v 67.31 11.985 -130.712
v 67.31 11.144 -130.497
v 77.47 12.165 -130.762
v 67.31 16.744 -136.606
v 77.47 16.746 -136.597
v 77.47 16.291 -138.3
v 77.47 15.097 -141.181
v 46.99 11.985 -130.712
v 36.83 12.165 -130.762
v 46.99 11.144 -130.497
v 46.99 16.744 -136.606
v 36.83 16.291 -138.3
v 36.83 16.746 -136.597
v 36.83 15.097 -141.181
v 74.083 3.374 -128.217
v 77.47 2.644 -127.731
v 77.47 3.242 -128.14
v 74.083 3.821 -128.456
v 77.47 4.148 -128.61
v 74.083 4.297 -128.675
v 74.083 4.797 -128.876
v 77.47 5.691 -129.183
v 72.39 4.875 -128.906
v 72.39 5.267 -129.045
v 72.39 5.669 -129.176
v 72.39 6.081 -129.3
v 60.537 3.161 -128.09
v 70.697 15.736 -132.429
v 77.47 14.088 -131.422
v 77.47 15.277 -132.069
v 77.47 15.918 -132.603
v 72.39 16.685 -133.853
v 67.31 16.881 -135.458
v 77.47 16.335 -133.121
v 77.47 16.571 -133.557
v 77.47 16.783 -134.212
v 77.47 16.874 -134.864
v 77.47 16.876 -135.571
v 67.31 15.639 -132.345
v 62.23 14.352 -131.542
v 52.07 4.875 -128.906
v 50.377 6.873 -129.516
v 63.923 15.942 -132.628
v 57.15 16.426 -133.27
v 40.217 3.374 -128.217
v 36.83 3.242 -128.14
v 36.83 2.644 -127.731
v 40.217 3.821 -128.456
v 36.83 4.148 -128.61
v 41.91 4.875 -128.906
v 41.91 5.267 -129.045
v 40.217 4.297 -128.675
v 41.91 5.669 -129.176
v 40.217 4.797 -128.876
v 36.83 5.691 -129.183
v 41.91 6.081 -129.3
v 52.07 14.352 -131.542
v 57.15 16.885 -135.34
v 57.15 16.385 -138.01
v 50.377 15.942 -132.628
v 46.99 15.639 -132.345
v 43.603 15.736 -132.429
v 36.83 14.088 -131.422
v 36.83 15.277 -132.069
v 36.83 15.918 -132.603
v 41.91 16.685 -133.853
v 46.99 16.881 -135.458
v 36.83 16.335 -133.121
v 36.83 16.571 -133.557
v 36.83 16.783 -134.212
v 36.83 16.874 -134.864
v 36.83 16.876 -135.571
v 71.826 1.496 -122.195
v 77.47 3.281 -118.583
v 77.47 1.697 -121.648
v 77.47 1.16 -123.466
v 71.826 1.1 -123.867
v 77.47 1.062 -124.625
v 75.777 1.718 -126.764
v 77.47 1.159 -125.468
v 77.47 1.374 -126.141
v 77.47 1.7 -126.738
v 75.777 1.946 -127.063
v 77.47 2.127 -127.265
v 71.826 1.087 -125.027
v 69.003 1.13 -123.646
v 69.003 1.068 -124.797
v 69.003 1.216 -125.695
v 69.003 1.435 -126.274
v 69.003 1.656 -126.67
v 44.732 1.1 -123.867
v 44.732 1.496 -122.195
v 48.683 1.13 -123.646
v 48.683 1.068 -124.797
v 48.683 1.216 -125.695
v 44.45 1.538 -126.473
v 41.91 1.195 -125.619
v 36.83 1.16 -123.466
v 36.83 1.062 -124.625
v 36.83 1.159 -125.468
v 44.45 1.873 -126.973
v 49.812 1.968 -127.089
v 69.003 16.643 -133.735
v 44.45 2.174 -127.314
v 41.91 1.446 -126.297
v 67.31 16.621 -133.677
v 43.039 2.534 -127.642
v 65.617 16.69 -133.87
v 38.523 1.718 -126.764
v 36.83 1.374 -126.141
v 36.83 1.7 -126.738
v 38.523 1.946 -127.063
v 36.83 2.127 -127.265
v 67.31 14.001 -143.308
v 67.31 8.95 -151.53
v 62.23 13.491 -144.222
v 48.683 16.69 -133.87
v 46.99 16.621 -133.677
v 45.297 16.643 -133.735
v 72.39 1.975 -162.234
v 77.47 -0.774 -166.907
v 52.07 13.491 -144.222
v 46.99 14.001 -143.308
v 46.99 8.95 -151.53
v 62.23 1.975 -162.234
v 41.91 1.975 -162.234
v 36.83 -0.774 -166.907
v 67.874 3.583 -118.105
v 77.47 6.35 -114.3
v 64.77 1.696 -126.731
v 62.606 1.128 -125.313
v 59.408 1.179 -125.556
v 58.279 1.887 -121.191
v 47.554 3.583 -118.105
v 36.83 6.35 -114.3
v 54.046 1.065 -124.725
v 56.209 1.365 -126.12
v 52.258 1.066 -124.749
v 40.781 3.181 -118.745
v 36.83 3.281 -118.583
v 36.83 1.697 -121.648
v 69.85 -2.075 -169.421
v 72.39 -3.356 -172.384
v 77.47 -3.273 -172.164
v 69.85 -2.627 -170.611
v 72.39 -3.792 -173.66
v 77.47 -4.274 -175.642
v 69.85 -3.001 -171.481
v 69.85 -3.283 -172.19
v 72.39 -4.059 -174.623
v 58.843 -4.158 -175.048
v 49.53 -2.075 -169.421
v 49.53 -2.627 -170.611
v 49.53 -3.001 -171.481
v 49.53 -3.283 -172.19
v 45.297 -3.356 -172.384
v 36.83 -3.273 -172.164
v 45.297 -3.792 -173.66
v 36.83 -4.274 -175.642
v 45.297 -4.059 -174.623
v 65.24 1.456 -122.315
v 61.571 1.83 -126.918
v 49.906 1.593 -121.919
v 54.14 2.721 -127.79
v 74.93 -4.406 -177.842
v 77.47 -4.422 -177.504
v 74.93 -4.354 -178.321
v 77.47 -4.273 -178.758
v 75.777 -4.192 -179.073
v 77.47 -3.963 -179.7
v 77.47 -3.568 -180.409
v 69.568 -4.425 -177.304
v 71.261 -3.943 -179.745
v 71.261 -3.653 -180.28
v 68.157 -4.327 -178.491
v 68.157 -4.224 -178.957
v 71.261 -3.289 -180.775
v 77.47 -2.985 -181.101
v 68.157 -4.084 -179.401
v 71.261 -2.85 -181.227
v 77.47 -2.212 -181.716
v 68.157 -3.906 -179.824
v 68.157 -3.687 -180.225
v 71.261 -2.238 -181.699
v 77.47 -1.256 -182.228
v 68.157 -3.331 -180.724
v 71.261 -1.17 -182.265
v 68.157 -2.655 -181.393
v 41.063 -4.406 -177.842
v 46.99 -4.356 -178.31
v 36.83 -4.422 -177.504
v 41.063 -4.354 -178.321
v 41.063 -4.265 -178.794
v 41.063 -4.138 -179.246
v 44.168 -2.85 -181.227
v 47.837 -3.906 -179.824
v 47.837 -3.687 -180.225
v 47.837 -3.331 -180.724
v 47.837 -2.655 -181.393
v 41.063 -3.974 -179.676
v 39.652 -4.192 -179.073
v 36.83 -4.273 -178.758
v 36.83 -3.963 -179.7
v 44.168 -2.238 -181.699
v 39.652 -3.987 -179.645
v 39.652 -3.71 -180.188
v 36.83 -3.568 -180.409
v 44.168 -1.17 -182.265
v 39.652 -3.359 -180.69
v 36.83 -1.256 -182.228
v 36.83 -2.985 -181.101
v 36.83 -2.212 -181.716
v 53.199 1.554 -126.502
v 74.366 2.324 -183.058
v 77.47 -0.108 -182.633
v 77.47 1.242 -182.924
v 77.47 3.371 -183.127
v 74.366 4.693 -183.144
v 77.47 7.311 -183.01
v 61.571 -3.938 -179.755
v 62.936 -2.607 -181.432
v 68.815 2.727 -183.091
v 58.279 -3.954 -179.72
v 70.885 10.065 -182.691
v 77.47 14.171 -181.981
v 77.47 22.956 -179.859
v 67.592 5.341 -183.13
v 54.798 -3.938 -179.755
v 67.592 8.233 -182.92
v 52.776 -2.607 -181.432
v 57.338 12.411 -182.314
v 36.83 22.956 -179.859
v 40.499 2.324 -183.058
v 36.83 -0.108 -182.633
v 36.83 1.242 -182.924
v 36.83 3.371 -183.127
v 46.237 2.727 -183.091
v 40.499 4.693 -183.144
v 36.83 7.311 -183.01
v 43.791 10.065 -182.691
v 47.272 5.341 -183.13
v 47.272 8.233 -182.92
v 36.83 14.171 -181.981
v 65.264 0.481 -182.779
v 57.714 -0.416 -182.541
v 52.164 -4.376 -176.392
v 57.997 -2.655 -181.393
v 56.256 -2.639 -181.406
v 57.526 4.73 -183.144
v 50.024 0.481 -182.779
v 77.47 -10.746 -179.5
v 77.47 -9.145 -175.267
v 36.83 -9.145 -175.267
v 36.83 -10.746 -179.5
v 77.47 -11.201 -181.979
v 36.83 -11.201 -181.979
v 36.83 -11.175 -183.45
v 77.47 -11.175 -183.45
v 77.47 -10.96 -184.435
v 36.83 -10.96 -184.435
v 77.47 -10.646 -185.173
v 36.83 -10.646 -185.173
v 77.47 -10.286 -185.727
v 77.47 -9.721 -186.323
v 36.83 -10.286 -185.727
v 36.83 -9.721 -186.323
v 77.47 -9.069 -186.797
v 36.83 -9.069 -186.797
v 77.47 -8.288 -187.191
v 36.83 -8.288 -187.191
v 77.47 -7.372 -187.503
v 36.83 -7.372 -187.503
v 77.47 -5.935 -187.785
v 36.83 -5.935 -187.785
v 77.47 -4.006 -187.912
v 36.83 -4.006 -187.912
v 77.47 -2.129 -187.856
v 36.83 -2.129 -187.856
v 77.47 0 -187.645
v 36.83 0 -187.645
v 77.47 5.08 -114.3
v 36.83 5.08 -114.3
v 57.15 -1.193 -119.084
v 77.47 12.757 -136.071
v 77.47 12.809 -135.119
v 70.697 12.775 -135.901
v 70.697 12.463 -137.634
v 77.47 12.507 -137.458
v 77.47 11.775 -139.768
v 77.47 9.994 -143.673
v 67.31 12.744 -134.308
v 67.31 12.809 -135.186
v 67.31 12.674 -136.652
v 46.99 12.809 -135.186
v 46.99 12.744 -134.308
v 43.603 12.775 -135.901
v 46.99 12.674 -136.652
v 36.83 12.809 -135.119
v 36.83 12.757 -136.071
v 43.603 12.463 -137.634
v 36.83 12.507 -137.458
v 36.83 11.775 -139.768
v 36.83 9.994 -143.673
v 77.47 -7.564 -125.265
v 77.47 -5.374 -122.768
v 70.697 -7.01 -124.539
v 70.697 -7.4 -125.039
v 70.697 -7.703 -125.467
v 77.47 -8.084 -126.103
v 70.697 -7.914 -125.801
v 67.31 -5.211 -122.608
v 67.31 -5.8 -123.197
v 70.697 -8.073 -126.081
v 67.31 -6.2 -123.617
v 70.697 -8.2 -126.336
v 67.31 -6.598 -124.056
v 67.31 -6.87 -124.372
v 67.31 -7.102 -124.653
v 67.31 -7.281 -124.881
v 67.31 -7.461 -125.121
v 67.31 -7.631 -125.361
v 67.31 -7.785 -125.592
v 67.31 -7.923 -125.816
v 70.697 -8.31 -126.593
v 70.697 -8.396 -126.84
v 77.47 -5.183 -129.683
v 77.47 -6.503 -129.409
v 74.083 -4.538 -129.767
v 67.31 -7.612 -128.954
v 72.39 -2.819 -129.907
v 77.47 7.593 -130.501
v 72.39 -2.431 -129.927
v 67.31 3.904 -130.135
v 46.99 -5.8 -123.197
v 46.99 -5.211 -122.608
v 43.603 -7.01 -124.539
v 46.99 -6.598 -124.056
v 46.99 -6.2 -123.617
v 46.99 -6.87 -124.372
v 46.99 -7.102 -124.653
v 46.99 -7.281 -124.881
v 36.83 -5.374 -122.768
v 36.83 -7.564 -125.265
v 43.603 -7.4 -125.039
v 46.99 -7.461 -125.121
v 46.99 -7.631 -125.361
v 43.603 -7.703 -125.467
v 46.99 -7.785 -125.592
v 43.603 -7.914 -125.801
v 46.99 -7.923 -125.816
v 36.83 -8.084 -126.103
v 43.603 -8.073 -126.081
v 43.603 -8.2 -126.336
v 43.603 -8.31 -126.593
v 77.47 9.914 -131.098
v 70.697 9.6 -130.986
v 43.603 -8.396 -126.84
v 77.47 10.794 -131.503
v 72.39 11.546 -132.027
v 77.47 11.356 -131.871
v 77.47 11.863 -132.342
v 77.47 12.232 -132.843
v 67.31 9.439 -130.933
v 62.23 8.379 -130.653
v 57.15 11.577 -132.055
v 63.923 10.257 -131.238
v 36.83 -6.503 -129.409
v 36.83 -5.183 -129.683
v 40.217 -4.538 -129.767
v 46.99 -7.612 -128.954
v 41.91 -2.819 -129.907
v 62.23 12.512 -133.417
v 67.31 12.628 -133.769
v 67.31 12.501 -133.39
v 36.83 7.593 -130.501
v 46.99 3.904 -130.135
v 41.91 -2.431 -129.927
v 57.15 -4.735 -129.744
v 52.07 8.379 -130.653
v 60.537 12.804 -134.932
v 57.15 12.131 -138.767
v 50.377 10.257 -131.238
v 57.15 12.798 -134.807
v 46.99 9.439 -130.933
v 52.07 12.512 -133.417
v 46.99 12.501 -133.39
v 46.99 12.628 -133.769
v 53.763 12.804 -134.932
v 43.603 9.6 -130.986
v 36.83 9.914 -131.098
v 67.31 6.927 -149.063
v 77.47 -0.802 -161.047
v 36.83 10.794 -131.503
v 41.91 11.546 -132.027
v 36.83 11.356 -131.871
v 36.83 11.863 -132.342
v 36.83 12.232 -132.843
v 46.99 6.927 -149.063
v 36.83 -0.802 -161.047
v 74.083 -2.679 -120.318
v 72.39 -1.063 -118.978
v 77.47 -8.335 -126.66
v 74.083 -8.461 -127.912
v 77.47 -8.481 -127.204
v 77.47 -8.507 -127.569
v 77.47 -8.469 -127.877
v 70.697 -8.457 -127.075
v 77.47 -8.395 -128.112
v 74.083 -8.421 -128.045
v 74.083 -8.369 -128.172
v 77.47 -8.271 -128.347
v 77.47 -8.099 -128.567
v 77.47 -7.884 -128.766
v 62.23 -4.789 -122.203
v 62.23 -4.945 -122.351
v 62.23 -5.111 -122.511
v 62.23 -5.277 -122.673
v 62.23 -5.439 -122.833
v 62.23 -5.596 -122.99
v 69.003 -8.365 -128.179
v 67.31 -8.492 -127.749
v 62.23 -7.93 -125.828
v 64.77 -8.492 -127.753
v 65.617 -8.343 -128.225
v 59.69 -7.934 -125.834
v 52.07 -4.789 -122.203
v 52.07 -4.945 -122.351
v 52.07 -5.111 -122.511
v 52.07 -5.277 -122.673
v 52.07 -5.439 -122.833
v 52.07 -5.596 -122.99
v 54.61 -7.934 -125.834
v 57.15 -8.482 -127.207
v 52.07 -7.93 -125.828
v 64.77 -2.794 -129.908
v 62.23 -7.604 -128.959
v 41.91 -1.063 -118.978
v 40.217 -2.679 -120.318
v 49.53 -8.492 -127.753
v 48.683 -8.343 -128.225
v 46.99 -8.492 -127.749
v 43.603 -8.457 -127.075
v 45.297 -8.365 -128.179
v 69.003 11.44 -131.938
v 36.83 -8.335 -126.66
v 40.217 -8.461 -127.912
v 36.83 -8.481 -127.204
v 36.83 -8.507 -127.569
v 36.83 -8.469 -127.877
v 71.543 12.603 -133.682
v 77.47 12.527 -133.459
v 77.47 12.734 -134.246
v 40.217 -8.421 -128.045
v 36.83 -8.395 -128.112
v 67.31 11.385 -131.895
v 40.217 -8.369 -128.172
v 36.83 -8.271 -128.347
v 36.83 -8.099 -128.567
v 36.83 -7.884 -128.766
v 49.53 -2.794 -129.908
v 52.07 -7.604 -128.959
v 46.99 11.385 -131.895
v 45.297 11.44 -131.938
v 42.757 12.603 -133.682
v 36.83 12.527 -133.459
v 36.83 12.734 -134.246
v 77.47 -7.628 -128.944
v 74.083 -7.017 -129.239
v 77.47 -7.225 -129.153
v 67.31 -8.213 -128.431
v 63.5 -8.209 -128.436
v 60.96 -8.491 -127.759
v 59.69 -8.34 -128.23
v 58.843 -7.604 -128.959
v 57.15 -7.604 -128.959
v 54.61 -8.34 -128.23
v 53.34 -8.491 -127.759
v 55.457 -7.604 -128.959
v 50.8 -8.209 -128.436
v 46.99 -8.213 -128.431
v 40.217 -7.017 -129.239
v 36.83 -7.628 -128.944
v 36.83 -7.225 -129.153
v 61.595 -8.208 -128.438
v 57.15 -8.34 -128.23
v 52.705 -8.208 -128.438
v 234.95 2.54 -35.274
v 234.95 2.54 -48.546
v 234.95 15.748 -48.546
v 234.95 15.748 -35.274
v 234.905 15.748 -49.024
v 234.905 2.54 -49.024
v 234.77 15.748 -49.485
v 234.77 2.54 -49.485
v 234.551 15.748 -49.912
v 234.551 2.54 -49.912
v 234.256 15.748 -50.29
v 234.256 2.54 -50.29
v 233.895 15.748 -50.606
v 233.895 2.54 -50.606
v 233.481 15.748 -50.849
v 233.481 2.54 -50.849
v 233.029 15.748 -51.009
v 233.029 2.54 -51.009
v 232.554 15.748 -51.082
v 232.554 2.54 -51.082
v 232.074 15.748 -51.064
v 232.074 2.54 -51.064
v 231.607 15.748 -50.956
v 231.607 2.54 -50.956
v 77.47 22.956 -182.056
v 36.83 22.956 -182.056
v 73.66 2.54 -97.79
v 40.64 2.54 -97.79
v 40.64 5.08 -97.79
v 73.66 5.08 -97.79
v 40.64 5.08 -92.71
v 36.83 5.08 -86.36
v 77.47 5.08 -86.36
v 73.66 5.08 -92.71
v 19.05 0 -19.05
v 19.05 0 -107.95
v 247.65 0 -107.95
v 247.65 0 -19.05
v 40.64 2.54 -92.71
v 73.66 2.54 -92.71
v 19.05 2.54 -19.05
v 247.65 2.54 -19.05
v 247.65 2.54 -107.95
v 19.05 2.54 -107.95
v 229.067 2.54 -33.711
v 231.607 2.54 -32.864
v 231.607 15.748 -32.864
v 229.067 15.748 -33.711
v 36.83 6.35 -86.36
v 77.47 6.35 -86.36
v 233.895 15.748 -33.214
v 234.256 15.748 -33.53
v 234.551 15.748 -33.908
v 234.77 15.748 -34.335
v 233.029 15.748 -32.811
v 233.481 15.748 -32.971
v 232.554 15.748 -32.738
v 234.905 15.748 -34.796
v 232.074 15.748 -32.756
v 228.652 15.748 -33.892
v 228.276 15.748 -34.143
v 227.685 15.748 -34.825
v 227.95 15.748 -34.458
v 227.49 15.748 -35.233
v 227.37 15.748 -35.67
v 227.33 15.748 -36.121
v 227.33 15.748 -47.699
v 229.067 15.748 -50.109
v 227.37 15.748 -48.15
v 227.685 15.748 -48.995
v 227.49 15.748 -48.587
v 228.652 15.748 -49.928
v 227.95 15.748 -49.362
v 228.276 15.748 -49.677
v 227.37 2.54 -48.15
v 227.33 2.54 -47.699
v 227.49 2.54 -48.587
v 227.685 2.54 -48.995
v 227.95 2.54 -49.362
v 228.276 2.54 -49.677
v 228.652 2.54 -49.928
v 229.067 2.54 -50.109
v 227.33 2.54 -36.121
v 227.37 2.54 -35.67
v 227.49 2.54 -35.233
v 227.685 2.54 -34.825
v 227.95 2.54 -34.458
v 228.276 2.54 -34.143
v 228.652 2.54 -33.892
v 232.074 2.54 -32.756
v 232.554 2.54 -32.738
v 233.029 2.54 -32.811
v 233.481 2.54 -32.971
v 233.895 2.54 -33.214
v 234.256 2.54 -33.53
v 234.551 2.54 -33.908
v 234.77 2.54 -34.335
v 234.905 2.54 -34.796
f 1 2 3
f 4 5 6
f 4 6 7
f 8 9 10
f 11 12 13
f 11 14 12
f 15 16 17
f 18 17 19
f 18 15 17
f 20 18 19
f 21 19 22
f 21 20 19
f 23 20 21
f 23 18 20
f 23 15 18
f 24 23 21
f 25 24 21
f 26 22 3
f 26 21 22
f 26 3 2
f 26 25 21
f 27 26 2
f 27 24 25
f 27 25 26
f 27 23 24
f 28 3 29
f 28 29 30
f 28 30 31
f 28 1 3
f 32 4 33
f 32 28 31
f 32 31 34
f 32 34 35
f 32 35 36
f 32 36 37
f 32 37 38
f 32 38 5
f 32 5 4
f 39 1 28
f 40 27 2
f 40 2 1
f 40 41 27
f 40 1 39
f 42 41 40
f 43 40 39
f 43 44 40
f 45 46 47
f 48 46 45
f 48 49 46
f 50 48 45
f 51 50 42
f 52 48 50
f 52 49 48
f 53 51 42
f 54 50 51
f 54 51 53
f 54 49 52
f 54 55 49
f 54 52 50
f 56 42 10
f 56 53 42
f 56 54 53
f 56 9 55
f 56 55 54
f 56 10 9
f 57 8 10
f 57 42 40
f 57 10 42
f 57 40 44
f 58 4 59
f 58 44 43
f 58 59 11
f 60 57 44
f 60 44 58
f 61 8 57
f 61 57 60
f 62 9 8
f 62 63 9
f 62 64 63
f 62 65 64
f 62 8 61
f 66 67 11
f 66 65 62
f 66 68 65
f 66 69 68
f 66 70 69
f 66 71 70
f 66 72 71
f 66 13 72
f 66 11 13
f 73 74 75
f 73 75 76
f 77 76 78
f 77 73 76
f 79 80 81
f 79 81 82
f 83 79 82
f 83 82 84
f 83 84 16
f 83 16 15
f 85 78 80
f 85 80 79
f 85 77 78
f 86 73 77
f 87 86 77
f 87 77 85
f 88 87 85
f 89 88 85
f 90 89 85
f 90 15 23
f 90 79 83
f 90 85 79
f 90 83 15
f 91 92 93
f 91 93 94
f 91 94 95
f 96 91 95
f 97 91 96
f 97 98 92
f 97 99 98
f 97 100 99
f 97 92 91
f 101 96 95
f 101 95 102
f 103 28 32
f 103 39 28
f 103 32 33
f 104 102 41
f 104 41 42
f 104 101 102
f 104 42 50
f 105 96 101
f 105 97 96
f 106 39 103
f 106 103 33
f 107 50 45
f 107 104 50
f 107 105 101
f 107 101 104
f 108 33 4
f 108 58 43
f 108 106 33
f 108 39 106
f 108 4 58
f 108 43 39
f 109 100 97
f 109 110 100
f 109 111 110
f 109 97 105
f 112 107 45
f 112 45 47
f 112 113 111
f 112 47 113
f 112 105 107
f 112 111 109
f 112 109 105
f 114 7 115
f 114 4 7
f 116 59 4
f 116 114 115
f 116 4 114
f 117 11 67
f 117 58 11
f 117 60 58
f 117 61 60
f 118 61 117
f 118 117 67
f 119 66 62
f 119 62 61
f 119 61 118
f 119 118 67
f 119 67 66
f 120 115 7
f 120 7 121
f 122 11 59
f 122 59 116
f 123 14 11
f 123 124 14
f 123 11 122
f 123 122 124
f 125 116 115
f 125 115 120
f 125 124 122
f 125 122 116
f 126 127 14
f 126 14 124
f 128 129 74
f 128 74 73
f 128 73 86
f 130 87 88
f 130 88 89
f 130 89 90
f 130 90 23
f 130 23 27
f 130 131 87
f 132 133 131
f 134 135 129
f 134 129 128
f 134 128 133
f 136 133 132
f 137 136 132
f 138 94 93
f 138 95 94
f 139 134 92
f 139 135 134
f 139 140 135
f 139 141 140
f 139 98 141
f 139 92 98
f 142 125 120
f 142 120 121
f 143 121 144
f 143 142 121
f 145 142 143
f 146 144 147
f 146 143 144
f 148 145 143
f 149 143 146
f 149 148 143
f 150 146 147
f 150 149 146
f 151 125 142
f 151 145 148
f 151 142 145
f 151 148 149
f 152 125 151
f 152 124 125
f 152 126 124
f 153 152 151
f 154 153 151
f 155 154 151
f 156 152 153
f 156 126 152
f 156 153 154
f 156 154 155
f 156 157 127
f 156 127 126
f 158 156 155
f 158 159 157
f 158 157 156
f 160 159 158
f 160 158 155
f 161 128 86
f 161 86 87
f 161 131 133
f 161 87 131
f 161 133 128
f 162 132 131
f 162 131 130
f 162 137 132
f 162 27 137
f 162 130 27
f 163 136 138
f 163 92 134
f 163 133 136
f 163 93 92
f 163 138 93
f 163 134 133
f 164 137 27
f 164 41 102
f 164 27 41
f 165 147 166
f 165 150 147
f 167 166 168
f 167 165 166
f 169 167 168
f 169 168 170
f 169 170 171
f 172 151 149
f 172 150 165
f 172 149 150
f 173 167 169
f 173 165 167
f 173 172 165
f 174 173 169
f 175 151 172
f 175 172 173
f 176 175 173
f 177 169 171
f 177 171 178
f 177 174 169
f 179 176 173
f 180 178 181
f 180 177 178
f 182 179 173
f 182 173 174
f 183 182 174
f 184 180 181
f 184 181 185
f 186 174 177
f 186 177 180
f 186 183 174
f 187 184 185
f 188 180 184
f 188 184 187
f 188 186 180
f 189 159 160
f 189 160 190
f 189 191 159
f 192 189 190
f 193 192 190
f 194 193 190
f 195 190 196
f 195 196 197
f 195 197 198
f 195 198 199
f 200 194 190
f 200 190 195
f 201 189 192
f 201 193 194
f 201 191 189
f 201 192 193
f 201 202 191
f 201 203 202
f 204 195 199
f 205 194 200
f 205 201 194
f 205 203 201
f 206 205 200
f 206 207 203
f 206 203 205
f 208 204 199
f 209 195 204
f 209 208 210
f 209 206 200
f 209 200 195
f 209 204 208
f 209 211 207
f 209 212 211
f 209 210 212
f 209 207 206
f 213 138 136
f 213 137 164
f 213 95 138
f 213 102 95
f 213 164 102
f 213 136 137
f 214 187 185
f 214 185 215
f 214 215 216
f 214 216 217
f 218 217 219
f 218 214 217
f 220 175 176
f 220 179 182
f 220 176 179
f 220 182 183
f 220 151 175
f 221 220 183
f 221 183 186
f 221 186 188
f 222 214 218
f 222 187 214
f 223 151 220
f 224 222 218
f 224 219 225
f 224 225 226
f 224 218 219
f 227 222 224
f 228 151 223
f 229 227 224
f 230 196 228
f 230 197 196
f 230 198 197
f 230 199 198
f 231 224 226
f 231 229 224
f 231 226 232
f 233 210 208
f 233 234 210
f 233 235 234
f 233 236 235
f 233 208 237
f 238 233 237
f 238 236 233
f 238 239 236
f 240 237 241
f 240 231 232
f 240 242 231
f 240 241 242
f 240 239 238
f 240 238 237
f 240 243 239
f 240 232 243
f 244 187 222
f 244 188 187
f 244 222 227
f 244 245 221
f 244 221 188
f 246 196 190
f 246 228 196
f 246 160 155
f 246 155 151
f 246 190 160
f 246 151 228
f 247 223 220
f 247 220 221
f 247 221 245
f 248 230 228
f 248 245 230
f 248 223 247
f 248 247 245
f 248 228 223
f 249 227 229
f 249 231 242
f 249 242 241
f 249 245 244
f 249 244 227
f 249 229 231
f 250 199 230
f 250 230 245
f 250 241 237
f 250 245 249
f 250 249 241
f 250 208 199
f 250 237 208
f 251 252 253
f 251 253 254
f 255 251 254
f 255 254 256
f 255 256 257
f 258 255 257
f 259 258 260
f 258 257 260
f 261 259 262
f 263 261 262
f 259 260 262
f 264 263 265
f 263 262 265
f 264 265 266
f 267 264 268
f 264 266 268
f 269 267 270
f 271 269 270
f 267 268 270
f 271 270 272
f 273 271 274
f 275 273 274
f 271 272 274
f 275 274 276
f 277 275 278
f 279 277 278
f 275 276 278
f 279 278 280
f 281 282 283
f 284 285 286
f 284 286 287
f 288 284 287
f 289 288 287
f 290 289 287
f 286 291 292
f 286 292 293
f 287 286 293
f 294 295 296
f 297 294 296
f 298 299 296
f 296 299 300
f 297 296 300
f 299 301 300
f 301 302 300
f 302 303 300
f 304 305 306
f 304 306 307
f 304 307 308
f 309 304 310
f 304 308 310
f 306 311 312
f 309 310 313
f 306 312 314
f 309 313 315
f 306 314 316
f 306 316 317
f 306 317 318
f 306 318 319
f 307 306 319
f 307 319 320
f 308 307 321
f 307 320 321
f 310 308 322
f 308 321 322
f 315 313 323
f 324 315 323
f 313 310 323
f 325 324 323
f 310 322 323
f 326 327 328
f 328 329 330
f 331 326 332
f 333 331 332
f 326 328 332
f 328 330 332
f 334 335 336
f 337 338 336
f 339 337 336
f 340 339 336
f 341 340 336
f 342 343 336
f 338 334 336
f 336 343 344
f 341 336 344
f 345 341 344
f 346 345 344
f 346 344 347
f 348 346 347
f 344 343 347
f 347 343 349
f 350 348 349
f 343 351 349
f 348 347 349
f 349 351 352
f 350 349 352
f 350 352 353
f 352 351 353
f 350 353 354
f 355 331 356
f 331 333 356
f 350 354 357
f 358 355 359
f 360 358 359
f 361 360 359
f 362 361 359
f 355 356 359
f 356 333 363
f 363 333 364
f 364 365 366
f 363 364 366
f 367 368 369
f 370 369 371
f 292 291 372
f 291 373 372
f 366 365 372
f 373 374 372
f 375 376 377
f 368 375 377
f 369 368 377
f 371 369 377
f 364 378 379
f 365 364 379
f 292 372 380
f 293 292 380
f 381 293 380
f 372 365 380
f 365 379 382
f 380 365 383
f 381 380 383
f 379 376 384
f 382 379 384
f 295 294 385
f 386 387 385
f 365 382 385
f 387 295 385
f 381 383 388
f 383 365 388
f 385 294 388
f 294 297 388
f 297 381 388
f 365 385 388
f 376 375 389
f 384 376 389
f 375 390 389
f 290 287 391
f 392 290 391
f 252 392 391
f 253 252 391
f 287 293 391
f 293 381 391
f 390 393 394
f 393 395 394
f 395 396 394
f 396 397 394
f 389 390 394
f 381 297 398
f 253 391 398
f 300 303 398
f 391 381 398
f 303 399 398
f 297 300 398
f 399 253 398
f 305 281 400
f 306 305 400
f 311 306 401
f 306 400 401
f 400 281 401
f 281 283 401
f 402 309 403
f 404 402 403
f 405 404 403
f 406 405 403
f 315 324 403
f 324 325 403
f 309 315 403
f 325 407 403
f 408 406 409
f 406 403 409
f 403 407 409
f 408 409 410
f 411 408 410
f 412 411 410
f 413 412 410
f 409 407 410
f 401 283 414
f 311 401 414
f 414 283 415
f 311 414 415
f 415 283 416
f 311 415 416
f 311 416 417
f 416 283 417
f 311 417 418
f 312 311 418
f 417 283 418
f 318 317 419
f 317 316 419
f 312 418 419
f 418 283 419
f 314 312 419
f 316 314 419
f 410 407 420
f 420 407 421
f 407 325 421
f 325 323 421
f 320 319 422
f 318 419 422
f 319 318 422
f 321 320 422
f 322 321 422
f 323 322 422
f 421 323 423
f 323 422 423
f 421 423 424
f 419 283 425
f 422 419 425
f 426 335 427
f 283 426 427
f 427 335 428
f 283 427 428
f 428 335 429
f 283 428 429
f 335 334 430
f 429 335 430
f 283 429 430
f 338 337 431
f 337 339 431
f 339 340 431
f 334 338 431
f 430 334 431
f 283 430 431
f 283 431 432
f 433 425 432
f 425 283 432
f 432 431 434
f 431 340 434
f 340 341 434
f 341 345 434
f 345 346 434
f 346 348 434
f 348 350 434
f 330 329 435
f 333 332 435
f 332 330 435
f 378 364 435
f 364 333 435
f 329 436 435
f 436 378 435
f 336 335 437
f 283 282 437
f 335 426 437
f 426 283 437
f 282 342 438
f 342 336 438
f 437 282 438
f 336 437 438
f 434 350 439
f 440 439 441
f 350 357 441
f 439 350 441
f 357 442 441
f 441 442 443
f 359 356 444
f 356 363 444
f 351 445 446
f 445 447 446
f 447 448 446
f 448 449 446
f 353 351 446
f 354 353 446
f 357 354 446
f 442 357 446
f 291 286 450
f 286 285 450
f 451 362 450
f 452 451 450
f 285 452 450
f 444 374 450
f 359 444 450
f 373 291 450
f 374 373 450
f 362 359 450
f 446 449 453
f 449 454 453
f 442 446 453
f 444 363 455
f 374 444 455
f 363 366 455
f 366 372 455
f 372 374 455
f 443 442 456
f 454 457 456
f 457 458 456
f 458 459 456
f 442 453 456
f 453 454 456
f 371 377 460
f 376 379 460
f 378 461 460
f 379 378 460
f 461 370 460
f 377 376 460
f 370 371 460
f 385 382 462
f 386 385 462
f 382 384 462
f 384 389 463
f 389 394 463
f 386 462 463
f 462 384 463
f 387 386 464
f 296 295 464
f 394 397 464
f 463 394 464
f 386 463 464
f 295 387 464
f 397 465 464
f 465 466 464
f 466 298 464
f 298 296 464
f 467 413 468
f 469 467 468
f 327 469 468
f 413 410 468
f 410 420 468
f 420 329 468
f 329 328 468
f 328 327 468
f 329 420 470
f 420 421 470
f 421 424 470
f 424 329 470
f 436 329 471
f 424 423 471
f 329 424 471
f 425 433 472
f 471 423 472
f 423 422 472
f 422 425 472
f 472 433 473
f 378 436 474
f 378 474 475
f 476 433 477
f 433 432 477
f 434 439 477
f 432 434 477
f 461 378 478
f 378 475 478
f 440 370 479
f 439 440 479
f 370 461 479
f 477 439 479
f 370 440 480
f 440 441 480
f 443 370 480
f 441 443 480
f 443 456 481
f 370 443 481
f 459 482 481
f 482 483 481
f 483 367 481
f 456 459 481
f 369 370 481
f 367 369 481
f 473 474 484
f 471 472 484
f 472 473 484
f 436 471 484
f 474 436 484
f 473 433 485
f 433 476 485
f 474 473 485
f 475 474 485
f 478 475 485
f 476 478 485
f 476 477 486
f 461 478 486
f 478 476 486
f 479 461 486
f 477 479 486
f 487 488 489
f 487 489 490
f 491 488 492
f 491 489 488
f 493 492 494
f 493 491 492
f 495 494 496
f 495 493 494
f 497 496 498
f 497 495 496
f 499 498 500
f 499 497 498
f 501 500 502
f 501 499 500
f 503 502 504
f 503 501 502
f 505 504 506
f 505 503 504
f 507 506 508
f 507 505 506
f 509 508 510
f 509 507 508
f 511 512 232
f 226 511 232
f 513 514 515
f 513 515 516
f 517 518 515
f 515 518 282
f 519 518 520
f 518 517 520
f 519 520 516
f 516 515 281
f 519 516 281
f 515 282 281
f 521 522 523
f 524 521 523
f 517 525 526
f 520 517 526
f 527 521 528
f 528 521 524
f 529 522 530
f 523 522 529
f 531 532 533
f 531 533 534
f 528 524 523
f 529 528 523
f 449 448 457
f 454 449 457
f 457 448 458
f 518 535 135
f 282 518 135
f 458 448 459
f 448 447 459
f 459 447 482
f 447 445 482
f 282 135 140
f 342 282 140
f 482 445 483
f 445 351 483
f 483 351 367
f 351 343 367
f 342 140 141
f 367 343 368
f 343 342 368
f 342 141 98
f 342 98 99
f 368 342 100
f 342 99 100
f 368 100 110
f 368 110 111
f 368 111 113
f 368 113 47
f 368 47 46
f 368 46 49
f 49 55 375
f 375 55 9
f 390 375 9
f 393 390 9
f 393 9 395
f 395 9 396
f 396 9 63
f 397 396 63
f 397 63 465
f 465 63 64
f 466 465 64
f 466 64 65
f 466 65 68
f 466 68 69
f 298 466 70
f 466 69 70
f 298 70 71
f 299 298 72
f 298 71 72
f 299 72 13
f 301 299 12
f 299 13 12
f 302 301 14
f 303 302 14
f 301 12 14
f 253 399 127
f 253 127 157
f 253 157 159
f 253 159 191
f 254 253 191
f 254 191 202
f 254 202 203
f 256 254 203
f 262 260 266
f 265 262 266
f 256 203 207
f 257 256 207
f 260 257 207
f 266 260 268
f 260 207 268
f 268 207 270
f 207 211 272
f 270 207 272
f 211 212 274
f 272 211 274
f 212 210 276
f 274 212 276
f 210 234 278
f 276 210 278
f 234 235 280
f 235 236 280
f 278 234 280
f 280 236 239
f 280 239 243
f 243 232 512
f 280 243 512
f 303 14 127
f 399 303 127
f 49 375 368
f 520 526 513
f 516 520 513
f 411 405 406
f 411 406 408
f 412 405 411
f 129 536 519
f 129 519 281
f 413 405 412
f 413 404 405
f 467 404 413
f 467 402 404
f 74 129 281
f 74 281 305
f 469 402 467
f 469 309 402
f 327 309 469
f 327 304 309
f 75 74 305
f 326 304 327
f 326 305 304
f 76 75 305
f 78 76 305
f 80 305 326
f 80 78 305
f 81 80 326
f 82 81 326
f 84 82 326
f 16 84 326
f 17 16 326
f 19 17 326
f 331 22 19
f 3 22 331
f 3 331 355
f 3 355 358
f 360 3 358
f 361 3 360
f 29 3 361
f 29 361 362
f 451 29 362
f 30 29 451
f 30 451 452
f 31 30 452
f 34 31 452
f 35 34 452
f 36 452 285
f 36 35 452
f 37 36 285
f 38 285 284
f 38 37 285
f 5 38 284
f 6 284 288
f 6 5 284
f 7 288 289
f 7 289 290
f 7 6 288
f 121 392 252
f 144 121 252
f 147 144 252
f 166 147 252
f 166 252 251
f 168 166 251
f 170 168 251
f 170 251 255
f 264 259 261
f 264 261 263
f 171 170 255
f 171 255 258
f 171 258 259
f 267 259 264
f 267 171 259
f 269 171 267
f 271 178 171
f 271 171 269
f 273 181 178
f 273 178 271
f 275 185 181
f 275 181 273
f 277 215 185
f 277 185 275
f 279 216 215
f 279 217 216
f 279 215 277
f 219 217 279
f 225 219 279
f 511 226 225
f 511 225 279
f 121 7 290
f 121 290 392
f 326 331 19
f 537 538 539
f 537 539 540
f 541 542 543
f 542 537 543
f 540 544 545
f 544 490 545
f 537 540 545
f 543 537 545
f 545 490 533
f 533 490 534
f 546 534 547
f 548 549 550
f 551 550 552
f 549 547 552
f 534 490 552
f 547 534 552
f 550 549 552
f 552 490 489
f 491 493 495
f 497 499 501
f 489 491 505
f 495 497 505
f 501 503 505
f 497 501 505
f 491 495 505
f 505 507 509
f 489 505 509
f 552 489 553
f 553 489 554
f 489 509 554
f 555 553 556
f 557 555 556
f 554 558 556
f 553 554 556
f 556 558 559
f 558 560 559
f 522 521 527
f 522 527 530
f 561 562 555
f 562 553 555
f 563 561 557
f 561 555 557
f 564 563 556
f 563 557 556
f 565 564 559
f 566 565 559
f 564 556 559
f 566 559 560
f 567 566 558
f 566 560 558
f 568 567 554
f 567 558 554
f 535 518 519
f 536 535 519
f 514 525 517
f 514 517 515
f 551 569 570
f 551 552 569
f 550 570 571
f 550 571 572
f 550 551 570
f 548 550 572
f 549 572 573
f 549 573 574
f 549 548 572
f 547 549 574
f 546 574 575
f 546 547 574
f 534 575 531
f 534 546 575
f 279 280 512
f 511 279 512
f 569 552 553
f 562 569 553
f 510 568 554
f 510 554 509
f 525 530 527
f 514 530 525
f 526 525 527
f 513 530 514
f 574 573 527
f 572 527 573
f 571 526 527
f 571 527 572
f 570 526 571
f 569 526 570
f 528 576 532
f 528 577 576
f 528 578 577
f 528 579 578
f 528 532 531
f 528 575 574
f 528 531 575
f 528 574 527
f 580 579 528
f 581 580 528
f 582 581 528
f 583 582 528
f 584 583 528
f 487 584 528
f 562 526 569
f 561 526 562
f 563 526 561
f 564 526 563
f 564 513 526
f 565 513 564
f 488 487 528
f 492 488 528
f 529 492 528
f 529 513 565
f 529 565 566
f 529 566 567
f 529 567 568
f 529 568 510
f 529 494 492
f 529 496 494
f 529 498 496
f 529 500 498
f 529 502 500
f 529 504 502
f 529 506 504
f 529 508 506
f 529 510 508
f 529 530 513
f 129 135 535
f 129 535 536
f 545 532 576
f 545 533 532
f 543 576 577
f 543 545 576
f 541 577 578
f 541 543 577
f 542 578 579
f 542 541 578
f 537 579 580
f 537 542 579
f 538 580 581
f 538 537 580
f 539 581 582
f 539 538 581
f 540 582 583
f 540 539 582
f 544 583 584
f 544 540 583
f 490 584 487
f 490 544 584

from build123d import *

# Parameters (mm, degrees)
SKETCH4_W           = 228.6
SKETCH4_H           = 88.9
BOSS_EXTRUDE3_DEPTH = 2.54
SKETCH5_W           = 33.02
SKETCH5_H           = 5.08
BOSS_EXTRUDE4_DEPTH = 2.54
SKETCH6_W           = 40.64
SKETCH6_H           = 27.94
BOSS_EXTRUDE5_DEPTH = 1.27
BOSS_EXTRUDE6_DEPTH = 40.64
BOSS_EXTRUDE7_DEPTH = 13.208
FILLET1_R           = 2.54


with BuildPart() as part:
    # Sketch4 → Boss-Extrude3 (new body)
    with BuildSketch(Plane(origin=(0, 0, 0), x_dir=(1, 0, 0), z_dir=(0, 1, 0))):
        with Locations((133.35, 63.5)):
            Rectangle(SKETCH4_W, SKETCH4_H)
    extrude(amount=BOSS_EXTRUDE3_DEPTH)

    # Sketch5 → Boss-Extrude4 (add)
    with BuildSketch(Plane(origin=(0, 2.54, 0), x_dir=(1, 0, 0), z_dir=(0, 1, 0))):
        with Locations((57.15, 95.25)):
            Rectangle(SKETCH5_W, SKETCH5_H)
    extrude(amount=BOSS_EXTRUDE4_DEPTH)

    # Sketch6 → Boss-Extrude5 (add)
    with BuildSketch(Plane(origin=(0, 5.08, 0), x_dir=(1, 0, 0), z_dir=(0, 1, 0))):
        with Locations((57.15, 100.33)):
            Rectangle(SKETCH6_W, SKETCH6_H)
    extrude(amount=BOSS_EXTRUDE5_DEPTH)

    # Sketch7 → Boss-Extrude6 (add)
    with BuildSketch(Plane.ZY.offset(-36.83)):
        with BuildLine():
            Line((-187.645232074, 0), (-182.055573159, 22.955935482))
            Line((-182.055573159, 22.955935482), (-179.858508249, 22.955935482))
            add(Edge.make_bspline(
                [(-114.3, 6.35), (-133.298148084, -8.81906553), (-116.510356825, 54.687069595), (-196.650549715, -37.947190727), (-179.858508249, 22.955935482)],
                knots=[0, 0, 0, 0, 0.345555248, 1, 1, 1, 1], degree=3))
            Line((-114.3, 6.35), (-114.3, 5.08))
            add(Edge.make_bspline(
                [(-114.3, 5.08), (-136.985708512, -26.134958418), (-109.503597428, 56.206538218), (-192.042694118, -34.207408775), (-187.645232074, 0)],
                knots=[0, 0, 0, 0, 0.382372791, 1, 1, 1, 1], degree=3))
        make_face()
    extrude(amount=-BOSS_EXTRUDE6_DEPTH)

    # Sketch8 → Boss-Extrude7 (add)
    with BuildSketch(Plane(origin=(0, 2.54, 0), x_dir=(1, 0, 0), z_dir=(0, 1, 0))):
        Polygon((227.33, 49.53), (234.95, 52.07), (234.95, 31.75), (227.33, 34.29), align=None)
    extrude(amount=BOSS_EXTRUDE7_DEPTH)

    # Fillet1
    fillet1_edges = [part.edges().sort_by_distance(p)[0] for p in [
        (227.33, 9.144, -49.53),
        (227.33, 9.144, -34.29),
        (234.95, 9.144, -31.75),
        (234.95, 9.144, -52.07),
    ]]
    fillet(fillet1_edges, radius=FILLET1_R)


solid = part.part
